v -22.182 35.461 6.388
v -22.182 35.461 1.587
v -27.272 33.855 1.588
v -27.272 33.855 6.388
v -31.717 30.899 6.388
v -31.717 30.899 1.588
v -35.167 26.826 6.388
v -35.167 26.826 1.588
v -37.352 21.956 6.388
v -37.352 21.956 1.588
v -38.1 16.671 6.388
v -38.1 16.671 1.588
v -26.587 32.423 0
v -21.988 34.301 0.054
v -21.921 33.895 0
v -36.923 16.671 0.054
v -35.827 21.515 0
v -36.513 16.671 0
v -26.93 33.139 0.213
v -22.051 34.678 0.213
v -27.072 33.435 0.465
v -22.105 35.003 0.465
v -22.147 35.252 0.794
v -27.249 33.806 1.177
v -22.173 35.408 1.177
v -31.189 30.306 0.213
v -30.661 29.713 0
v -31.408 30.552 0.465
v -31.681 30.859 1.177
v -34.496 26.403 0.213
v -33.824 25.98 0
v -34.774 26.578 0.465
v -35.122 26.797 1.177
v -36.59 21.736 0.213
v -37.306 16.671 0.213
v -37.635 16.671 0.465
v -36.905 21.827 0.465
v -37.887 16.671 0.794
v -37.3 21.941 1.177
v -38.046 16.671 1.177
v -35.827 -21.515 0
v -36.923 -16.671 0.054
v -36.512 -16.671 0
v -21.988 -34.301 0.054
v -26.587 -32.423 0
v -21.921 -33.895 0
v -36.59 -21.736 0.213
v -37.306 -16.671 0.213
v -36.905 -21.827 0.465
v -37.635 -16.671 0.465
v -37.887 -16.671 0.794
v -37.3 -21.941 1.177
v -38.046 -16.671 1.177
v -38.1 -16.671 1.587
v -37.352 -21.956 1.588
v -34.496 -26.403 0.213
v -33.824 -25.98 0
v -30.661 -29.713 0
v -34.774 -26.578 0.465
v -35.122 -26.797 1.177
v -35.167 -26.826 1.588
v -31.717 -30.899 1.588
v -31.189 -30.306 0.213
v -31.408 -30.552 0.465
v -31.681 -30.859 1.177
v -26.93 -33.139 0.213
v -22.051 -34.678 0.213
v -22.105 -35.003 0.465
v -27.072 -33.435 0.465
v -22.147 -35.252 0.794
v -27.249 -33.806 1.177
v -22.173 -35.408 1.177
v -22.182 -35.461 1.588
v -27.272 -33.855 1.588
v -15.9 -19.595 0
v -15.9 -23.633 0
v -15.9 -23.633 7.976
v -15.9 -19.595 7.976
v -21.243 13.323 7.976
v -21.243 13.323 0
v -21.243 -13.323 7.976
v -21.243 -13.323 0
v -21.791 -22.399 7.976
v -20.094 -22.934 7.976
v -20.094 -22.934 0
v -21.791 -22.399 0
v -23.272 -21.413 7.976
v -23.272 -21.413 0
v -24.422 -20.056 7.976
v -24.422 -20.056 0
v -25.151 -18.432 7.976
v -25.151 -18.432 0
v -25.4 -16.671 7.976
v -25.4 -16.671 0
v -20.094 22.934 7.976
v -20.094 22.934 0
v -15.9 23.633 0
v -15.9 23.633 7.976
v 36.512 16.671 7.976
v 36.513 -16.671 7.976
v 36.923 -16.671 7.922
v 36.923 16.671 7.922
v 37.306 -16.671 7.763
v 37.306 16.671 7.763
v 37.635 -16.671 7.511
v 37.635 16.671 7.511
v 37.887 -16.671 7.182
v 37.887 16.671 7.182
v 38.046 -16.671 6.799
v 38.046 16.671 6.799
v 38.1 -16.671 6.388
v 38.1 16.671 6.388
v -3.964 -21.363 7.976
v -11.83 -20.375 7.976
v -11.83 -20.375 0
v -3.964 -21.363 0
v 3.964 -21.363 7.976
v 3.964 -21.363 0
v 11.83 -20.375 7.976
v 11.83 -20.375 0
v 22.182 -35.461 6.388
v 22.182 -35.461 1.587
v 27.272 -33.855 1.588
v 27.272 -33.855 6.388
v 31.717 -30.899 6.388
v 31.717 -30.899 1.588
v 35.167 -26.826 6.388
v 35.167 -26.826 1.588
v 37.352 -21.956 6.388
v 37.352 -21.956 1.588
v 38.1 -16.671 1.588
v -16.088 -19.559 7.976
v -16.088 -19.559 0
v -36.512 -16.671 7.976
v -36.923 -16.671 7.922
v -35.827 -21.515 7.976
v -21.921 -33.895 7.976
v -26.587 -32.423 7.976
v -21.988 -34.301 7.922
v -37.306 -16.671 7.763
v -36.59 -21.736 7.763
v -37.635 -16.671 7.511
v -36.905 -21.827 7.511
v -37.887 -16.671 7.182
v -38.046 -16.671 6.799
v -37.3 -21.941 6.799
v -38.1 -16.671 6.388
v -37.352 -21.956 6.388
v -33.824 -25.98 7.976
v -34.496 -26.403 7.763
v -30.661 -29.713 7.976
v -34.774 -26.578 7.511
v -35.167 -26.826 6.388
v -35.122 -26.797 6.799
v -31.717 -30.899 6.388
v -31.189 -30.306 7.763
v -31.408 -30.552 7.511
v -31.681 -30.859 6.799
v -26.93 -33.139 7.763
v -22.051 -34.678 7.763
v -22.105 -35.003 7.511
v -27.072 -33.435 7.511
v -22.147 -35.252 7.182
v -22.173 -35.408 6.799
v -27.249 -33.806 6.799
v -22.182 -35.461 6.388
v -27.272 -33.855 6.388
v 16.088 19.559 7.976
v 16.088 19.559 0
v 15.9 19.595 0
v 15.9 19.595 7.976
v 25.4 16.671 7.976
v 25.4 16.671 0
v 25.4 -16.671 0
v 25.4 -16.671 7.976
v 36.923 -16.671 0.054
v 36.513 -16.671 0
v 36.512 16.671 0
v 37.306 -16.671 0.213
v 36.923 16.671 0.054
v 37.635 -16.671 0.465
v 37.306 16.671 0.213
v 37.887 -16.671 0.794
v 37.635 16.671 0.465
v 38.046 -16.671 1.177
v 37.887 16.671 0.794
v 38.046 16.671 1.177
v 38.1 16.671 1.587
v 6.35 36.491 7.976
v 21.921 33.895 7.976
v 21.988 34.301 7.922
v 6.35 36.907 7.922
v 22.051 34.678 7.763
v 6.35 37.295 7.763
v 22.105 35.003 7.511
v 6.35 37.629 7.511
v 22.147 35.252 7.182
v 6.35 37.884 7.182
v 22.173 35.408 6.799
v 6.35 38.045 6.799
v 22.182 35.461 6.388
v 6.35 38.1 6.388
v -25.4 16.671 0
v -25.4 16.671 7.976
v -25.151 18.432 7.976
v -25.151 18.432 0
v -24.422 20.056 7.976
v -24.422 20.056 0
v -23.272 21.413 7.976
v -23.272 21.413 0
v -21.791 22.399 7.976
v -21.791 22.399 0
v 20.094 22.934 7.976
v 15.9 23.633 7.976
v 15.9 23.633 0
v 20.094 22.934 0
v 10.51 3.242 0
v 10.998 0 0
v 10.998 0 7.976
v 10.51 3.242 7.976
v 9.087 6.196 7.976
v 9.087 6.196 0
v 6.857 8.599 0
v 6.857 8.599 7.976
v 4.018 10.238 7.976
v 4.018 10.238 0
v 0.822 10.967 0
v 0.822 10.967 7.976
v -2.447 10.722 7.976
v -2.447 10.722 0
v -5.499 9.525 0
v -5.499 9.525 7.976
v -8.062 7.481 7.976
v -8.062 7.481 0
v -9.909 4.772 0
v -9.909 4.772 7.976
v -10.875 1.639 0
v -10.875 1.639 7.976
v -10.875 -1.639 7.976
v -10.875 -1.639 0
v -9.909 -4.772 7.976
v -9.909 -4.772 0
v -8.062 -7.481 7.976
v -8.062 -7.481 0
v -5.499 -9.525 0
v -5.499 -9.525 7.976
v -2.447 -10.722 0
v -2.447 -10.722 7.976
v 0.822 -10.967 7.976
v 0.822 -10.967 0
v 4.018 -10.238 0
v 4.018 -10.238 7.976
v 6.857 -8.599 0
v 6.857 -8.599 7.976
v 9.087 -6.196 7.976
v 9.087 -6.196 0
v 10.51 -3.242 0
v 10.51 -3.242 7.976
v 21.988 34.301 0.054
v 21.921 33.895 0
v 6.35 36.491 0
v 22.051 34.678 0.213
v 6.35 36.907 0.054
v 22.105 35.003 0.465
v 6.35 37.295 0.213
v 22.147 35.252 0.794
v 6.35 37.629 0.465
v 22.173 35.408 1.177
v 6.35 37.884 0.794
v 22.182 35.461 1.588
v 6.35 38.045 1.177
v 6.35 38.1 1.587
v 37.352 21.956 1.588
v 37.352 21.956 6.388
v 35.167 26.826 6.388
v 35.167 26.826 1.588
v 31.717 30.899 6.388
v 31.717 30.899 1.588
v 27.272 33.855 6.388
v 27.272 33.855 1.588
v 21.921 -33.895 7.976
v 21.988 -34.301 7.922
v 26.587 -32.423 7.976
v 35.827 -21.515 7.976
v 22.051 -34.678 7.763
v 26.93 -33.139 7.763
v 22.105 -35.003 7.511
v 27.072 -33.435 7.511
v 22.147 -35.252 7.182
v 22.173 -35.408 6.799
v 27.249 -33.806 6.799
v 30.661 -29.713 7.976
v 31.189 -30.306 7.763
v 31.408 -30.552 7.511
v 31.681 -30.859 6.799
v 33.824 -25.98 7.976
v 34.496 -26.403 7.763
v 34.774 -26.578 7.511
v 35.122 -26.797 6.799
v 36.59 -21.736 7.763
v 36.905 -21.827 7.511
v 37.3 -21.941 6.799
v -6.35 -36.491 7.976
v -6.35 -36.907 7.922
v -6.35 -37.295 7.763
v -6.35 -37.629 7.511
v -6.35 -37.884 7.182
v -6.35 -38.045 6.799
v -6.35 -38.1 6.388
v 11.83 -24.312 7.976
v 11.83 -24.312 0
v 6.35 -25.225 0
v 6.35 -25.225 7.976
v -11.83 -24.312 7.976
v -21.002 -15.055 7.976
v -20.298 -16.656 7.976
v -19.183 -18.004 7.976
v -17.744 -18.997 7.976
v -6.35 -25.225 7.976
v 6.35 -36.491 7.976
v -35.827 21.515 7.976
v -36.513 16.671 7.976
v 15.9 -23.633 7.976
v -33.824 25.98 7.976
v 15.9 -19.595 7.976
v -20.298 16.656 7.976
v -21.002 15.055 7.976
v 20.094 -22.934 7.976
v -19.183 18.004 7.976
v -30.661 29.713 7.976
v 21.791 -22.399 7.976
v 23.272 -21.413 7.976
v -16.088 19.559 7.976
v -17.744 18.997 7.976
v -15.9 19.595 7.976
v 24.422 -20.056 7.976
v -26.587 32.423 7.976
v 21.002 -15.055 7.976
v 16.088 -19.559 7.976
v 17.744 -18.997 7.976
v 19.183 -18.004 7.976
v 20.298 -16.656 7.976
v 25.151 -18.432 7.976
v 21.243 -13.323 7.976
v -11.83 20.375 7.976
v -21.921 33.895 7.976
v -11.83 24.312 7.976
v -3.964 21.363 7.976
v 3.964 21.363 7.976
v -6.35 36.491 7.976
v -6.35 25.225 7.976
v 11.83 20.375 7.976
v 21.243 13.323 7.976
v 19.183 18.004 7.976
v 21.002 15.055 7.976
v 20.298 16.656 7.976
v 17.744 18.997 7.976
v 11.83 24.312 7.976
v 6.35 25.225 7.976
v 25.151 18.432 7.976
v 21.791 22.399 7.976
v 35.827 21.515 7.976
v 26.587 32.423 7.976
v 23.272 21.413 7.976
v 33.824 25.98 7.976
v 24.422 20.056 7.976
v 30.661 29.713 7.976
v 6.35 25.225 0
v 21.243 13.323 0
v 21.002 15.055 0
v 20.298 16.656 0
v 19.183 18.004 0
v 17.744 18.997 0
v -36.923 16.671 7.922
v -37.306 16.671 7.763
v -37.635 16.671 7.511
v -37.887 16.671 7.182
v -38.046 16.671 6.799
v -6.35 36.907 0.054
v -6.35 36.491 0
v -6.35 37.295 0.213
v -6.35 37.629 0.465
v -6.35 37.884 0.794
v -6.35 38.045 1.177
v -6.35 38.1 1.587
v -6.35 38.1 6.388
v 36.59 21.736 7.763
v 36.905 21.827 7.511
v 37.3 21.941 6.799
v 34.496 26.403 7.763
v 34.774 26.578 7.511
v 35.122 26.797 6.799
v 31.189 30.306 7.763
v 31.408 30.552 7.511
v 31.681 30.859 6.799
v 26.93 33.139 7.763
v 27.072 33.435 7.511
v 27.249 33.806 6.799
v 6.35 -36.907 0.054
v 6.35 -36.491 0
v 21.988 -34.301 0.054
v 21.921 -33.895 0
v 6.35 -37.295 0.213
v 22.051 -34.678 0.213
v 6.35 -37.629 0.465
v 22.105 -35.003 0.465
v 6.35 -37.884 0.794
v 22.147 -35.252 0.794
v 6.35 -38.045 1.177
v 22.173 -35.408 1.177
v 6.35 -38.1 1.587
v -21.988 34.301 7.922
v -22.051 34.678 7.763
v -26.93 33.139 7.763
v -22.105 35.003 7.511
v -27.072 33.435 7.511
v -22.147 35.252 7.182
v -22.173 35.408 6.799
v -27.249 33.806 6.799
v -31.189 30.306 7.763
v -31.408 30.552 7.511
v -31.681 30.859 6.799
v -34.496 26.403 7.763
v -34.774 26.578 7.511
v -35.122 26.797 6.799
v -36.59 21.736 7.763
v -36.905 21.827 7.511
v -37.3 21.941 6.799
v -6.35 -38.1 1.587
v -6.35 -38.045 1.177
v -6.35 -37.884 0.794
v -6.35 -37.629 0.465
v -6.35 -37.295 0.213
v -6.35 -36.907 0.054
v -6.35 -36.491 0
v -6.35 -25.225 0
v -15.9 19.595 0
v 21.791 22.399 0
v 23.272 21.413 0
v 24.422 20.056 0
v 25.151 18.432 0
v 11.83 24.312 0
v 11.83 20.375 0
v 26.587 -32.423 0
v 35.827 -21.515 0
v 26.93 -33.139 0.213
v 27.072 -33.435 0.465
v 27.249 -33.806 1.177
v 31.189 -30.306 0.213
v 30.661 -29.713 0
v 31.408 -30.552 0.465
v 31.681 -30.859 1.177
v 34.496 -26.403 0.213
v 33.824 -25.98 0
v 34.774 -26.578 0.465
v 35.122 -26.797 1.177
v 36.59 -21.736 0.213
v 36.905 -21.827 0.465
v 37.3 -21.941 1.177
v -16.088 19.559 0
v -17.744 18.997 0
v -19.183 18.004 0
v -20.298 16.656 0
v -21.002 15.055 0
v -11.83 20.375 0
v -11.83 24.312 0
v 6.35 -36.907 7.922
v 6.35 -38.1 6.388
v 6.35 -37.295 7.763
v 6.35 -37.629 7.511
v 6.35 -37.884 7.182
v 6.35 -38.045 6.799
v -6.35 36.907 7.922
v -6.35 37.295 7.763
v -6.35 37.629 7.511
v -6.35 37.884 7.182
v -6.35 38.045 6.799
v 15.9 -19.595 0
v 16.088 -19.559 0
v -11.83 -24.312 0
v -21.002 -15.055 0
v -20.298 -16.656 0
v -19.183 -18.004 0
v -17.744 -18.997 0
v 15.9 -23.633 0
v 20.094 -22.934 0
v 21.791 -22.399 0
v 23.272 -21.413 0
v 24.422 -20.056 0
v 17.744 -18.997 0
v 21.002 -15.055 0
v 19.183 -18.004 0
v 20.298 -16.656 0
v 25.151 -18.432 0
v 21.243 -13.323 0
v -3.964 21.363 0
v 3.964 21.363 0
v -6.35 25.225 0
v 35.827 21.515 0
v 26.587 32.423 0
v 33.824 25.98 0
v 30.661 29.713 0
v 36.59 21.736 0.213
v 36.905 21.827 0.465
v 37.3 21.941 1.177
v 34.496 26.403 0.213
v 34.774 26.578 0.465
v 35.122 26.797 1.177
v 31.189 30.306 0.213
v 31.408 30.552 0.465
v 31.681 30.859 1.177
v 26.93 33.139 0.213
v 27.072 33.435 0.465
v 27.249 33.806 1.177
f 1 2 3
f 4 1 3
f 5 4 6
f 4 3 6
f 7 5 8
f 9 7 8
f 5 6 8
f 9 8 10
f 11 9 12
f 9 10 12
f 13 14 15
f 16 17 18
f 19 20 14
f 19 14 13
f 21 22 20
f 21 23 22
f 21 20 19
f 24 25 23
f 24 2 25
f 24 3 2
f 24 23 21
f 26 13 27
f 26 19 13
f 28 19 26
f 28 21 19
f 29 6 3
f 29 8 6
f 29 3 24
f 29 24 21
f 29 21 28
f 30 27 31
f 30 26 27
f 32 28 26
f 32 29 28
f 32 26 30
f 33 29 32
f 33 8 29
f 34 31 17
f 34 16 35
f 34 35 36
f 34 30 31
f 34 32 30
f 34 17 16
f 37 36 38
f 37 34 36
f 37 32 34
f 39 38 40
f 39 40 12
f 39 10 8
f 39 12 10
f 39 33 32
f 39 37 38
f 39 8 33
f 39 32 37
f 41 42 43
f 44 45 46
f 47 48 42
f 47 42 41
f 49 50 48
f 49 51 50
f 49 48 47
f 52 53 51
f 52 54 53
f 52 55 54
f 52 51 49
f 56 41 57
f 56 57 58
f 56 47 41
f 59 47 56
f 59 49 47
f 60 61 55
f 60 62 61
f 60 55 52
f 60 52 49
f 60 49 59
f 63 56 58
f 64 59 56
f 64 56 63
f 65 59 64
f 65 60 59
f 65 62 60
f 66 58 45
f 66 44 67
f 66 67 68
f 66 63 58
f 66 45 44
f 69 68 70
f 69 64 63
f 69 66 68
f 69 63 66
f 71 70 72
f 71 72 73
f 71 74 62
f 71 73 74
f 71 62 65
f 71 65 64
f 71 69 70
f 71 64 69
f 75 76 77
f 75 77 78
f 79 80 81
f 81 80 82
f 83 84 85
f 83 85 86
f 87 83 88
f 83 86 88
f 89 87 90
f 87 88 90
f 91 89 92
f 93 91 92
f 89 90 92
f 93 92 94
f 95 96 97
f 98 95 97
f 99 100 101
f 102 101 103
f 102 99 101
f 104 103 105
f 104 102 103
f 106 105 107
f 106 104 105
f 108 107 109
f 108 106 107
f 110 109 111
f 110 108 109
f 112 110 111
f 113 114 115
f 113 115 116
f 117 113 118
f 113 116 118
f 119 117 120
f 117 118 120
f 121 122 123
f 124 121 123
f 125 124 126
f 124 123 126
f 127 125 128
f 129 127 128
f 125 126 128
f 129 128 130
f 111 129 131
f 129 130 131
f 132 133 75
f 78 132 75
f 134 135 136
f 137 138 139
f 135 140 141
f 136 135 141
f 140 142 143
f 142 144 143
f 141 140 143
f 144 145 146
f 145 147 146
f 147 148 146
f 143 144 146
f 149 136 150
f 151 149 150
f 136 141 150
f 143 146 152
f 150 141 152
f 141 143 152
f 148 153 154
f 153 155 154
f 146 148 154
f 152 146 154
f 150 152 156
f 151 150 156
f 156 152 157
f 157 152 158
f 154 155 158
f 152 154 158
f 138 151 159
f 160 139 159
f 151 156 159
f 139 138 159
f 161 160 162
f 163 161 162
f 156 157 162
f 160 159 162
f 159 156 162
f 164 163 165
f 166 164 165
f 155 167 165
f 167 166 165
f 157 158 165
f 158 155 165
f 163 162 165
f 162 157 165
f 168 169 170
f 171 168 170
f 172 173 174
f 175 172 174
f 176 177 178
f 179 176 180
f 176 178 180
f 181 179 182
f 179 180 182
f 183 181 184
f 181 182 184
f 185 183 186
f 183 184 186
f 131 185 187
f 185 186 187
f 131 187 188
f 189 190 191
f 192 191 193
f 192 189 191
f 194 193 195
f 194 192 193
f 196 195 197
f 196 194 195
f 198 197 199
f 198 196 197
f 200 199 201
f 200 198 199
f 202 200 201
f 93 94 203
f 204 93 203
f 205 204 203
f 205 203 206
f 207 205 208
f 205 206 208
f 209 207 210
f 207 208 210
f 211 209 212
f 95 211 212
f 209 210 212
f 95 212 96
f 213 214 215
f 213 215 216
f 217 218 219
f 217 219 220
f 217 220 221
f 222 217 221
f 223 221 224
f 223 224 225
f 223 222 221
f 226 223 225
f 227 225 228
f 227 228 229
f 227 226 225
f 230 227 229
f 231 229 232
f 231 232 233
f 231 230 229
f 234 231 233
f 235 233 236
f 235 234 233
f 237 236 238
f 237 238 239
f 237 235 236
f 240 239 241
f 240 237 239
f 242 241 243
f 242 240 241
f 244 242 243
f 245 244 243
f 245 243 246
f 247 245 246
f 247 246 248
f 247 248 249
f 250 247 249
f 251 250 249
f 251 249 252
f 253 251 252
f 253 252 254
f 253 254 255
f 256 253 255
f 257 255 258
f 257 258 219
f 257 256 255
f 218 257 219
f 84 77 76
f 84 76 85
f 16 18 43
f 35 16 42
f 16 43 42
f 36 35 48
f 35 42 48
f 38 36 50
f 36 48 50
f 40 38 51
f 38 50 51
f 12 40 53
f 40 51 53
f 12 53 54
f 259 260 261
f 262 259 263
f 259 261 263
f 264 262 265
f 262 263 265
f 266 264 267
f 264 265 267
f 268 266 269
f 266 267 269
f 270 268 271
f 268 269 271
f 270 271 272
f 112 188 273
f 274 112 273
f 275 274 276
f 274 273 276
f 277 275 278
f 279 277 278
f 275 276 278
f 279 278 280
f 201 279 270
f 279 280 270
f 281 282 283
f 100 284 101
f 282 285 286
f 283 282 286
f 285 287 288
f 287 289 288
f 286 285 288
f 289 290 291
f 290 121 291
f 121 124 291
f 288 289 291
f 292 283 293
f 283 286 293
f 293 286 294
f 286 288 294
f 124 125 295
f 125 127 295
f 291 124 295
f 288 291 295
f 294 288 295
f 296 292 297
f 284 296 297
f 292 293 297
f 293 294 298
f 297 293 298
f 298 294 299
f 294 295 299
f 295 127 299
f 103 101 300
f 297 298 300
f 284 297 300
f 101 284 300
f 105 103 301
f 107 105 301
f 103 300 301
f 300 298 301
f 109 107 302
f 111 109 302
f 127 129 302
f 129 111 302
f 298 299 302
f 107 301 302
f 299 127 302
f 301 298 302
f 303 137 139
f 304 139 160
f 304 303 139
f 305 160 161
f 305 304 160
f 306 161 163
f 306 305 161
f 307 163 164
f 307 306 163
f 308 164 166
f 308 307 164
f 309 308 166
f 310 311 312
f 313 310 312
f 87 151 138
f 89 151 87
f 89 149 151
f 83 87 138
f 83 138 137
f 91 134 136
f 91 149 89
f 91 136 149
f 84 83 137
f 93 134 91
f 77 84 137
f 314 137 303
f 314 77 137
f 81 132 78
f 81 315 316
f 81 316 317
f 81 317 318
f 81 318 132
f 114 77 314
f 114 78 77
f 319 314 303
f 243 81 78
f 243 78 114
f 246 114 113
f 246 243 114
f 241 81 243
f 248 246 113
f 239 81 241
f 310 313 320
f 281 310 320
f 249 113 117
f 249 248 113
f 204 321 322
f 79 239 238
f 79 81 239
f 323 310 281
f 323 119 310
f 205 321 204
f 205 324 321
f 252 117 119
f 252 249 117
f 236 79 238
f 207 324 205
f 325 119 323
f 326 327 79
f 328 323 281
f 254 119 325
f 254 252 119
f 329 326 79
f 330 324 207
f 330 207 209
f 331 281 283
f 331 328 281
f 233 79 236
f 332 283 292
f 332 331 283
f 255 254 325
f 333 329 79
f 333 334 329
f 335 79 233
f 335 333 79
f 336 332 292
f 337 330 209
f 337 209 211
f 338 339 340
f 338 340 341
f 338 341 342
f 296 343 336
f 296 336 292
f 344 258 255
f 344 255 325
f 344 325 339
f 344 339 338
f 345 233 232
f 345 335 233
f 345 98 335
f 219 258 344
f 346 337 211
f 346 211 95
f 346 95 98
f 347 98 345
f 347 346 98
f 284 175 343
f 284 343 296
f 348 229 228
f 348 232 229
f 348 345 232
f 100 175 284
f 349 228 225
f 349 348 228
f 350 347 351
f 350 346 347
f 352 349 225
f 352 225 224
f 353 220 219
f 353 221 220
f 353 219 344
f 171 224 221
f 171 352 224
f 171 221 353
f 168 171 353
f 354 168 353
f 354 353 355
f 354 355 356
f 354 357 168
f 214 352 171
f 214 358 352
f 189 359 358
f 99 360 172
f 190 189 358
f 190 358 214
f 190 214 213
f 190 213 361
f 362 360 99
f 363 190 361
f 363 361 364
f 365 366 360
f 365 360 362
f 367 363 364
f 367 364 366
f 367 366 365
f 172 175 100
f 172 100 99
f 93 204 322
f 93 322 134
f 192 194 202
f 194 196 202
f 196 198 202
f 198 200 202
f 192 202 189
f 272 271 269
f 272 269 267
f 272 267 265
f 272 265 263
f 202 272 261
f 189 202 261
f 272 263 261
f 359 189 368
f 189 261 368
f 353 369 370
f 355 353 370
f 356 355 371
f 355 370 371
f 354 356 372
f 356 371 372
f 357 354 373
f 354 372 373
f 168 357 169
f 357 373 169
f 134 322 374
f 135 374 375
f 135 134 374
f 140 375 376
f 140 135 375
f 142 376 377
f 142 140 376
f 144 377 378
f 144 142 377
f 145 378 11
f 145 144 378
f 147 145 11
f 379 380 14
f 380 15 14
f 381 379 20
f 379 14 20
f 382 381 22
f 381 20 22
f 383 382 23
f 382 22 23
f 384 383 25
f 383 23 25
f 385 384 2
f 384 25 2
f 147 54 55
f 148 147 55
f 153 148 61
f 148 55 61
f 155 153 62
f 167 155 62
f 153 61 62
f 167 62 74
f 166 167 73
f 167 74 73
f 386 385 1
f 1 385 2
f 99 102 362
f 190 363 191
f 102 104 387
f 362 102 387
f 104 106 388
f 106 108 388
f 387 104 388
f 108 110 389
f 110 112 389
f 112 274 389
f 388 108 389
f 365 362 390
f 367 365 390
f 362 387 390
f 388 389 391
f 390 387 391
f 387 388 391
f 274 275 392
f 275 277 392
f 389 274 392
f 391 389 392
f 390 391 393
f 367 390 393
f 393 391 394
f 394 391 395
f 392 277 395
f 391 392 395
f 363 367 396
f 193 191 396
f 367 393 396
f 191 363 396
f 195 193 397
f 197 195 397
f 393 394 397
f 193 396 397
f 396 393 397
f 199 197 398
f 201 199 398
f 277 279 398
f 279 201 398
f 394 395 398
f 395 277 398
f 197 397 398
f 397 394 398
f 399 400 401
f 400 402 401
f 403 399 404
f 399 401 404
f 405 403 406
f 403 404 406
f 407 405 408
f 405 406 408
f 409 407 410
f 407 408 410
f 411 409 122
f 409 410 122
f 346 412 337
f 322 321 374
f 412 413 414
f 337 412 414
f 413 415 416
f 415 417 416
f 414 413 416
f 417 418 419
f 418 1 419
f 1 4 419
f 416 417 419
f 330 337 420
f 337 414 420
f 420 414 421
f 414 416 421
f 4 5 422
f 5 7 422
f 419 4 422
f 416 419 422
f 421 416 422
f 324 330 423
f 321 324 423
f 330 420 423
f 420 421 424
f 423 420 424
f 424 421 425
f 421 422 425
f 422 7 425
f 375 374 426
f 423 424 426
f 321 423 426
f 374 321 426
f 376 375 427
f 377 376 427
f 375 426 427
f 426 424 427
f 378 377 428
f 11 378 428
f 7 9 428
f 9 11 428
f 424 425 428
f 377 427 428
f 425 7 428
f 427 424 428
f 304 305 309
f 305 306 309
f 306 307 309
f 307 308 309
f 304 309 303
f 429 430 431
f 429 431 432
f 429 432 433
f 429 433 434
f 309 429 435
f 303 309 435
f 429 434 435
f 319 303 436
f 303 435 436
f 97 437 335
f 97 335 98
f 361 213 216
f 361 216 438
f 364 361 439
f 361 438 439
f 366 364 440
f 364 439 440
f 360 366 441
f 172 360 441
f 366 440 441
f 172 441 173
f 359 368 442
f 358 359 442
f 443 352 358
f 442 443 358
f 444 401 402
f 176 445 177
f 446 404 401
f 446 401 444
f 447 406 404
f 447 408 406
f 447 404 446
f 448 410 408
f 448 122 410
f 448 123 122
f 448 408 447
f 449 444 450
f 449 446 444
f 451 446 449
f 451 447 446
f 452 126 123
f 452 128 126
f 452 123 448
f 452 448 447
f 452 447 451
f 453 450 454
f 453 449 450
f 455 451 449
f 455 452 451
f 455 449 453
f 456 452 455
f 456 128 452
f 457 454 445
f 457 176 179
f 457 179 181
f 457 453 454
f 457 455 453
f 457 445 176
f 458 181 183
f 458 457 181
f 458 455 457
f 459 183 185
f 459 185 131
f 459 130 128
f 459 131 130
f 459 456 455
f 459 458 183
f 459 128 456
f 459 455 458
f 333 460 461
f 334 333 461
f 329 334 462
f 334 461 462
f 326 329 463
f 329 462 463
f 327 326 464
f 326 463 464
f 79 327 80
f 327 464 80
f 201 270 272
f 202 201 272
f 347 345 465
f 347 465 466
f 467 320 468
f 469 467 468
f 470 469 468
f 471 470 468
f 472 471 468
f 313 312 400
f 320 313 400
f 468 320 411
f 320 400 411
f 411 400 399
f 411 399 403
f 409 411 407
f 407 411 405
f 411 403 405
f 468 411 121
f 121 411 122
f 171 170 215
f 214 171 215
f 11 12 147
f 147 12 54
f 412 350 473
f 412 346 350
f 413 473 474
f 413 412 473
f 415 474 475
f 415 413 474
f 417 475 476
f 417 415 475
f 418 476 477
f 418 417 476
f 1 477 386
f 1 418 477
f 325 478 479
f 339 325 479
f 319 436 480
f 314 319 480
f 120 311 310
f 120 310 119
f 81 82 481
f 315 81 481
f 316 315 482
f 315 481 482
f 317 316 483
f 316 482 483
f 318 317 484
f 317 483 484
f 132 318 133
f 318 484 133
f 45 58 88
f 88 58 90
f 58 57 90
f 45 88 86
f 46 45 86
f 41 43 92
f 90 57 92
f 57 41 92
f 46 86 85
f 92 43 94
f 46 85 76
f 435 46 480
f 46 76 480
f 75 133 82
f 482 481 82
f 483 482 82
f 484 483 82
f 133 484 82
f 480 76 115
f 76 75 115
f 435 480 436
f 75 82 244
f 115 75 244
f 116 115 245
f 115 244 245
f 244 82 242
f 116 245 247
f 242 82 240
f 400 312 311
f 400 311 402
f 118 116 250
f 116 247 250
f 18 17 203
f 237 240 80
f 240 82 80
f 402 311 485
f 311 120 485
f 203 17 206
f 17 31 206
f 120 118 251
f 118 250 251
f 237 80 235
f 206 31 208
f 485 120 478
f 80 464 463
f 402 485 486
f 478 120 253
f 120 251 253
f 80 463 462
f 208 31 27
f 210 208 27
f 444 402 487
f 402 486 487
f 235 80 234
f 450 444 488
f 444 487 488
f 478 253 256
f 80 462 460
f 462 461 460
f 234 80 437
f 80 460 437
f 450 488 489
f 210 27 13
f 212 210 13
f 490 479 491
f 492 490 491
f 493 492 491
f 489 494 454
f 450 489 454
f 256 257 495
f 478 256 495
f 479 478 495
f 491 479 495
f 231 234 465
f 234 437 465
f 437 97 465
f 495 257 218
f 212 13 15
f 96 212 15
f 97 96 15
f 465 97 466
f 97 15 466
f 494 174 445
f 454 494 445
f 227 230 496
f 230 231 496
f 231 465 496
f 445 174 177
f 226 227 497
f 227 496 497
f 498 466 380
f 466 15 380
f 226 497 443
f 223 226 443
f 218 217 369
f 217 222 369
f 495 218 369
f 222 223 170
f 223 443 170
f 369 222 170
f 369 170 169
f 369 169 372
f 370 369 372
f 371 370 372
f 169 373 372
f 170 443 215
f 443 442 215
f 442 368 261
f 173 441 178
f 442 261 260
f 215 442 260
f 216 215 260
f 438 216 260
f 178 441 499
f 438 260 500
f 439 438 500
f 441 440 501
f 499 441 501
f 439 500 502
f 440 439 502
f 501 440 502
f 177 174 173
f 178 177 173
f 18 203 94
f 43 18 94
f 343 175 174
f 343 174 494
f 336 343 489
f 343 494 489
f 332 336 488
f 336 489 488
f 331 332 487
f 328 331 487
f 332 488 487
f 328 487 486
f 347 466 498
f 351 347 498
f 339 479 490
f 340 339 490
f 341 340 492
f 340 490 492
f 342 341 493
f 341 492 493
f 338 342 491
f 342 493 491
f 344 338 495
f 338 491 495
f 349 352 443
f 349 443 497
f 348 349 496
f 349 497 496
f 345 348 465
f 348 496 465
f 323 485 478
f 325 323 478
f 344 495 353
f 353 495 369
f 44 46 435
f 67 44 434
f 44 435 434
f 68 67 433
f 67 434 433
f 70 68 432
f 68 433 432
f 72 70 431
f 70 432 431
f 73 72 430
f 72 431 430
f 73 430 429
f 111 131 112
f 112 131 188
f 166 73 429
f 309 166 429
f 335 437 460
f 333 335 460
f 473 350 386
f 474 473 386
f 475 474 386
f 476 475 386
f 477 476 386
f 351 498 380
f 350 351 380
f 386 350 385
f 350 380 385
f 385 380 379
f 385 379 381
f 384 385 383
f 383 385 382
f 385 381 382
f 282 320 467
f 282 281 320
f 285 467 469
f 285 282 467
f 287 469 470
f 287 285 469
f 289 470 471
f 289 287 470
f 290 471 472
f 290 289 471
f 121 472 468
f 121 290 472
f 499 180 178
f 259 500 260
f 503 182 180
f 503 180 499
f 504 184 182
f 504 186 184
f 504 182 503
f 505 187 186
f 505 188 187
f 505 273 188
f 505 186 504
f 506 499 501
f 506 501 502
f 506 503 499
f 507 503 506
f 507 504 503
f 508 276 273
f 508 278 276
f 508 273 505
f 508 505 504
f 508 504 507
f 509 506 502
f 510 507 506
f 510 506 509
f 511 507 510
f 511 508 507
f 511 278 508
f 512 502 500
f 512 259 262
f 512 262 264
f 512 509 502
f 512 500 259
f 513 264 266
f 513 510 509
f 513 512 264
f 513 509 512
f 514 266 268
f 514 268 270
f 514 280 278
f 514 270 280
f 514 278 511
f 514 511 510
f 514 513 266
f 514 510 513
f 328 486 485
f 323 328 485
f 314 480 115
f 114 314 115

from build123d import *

# Parameters (mm, degrees)
F0_R     = 10.9982
F1_DEPTH = 7.9756
F3_DEPTH = 7.9756
F4_W     = 4.070462
F4_H     = 10.939364
F5_DEPTH = 7.9756
F6_R     = 1.5875


with BuildPart() as f1:
    # F0 (on Top) → F1 (new body)
    with BuildSketch(Plane.XY):
        with BuildLine():
            ThreePointArc((11.950254, 20.352071), (0, 21.486685), (-11.950254, 20.352071))
            Line((-11.950254, 20.352071), (-16.087743, 19.559259))
            ThreePointArc((-16.087743, 19.559259), (-19.787148, 17.368341), (-21.242717, 13.32272))
            Line((-21.242717, 13.32272), (-21.242717, 0))
            Line((-21.242717, 0), (-21.242717, -13.32272))
            ThreePointArc((-21.242717, -13.32272), (-19.787148, -17.368341), (-16.087743, -19.559259))
            Line((-16.087743, -19.559259), (-11.950254, -20.352071))
            ThreePointArc((-11.950254, -20.352071), (0, -21.486685), (11.950254, -20.352071))
            Line((11.950254, -20.352071), (16.087743, -19.559259))
            ThreePointArc((16.087743, -19.559259), (19.787148, -17.368341), (21.242717, -13.32272))
            Line((21.242717, -13.32272), (21.242717, 0))
            Line((21.242717, 0), (21.242717, 13.32272))
            ThreePointArc((21.242717, 13.32272), (19.787148, 17.368341), (16.087743, 19.559259))
            Line((16.087743, 19.559259), (11.950254, 20.352071))
        make_face()
        Circle(F0_R, mode=Mode.SUBTRACT)
    extrude(amount=F1_DEPTH)



with BuildPart() as f3:
    # F2 (on Top) → F3 (new body)
    with BuildSketch(Plane.XY):
        with BuildLine():
            ThreePointArc((-22.1818, 35.461367), (-33.585531, 28.984005), (-38.1, 16.670563))
            Line((-38.1, 16.670563), (-38.1, -16.670563))
            ThreePointArc((-38.1, -16.670563), (-33.585531, -28.984005), (-22.1818, -35.461367))
            Line((-22.1818, -35.461367), (-6.35, -38.1))
            Line((-6.35, -38.1), (-6.35, -25.224819))
            Line((-6.35, -25.224819), (-20.093933, -22.934164))
            ThreePointArc((-20.093933, -22.934164), (-23.895177, -20.775043), (-25.4, -16.670563))
            Line((-25.4, -16.670563), (-25.4, 16.670563))
            ThreePointArc((-25.4, 16.670563), (-23.895177, 20.775043), (-20.093933, 22.934164))
            Line((-20.093933, 22.934164), (-6.35, 25.224819))
            Line((-6.35, 25.224819), (-6.35, 38.1))
            Line((-6.35, 38.1), (-22.1818, 35.461367))
        make_face()
        with BuildLine():
            Line((38.1, -16.670563), (38.1, 16.670563))
            ThreePointArc((38.1, 16.670563), (33.585531, 28.984005), (22.1818, 35.461367))
            Line((22.1818, 35.461367), (6.35, 38.1))
            Line((6.35, 38.1), (6.35, 25.224819))
            Line((6.35, 25.224819), (20.093933, 22.934164))
            ThreePointArc((20.093933, 22.934164), (23.895177, 20.775043), (25.4, 16.670563))
            Line((25.4, 16.670563), (25.4, -16.670563))
            ThreePointArc((25.4, -16.670563), (23.895177, -20.775043), (20.093933, -22.934164))
            Line((20.093933, -22.934164), (6.35, -25.224819))
            Line((6.35, -25.224819), (6.35, -38.1))
            Line((6.35, -38.1), (22.1818, -35.461367))
            ThreePointArc((22.1818, -35.461367), (33.585531, -28.984005), (38.1, -16.670563))
        make_face()
    extrude(amount=F3_DEPTH)


with BuildPart() as f1_1:
    add(f1.part)

    add(f3.part)  # F5 merges F3
    # F4 (on Top) → F5 (join)
    with BuildSketch(Plane.XY):
        with Locations((-13.865008, 21.497123)):
            Rectangle(F4_W, F4_H)
        with Locations((13.865008, 21.497123)):
            Rectangle(F4_W, F4_H)
        with Locations((13.865008, -21.497123)):
            Rectangle(F4_W, F4_H)
        with Locations((-13.865008, -21.497123)):
            Rectangle(F4_W, F4_H)
    extrude(amount=F5_DEPTH)

    # F6
    f6_edges = [f1_1.edges().sort_by_distance(p)[0] for p in [
        (-14.2659, -36.780683, 7.9756),
        (14.2659, -36.780683, 7.9756),
        (14.2659, -36.780683, 0),
        (-14.2659, -36.780683, 0),
    ]]
    fillet(f6_edges, radius=F6_R)


solid = f1_1.part
